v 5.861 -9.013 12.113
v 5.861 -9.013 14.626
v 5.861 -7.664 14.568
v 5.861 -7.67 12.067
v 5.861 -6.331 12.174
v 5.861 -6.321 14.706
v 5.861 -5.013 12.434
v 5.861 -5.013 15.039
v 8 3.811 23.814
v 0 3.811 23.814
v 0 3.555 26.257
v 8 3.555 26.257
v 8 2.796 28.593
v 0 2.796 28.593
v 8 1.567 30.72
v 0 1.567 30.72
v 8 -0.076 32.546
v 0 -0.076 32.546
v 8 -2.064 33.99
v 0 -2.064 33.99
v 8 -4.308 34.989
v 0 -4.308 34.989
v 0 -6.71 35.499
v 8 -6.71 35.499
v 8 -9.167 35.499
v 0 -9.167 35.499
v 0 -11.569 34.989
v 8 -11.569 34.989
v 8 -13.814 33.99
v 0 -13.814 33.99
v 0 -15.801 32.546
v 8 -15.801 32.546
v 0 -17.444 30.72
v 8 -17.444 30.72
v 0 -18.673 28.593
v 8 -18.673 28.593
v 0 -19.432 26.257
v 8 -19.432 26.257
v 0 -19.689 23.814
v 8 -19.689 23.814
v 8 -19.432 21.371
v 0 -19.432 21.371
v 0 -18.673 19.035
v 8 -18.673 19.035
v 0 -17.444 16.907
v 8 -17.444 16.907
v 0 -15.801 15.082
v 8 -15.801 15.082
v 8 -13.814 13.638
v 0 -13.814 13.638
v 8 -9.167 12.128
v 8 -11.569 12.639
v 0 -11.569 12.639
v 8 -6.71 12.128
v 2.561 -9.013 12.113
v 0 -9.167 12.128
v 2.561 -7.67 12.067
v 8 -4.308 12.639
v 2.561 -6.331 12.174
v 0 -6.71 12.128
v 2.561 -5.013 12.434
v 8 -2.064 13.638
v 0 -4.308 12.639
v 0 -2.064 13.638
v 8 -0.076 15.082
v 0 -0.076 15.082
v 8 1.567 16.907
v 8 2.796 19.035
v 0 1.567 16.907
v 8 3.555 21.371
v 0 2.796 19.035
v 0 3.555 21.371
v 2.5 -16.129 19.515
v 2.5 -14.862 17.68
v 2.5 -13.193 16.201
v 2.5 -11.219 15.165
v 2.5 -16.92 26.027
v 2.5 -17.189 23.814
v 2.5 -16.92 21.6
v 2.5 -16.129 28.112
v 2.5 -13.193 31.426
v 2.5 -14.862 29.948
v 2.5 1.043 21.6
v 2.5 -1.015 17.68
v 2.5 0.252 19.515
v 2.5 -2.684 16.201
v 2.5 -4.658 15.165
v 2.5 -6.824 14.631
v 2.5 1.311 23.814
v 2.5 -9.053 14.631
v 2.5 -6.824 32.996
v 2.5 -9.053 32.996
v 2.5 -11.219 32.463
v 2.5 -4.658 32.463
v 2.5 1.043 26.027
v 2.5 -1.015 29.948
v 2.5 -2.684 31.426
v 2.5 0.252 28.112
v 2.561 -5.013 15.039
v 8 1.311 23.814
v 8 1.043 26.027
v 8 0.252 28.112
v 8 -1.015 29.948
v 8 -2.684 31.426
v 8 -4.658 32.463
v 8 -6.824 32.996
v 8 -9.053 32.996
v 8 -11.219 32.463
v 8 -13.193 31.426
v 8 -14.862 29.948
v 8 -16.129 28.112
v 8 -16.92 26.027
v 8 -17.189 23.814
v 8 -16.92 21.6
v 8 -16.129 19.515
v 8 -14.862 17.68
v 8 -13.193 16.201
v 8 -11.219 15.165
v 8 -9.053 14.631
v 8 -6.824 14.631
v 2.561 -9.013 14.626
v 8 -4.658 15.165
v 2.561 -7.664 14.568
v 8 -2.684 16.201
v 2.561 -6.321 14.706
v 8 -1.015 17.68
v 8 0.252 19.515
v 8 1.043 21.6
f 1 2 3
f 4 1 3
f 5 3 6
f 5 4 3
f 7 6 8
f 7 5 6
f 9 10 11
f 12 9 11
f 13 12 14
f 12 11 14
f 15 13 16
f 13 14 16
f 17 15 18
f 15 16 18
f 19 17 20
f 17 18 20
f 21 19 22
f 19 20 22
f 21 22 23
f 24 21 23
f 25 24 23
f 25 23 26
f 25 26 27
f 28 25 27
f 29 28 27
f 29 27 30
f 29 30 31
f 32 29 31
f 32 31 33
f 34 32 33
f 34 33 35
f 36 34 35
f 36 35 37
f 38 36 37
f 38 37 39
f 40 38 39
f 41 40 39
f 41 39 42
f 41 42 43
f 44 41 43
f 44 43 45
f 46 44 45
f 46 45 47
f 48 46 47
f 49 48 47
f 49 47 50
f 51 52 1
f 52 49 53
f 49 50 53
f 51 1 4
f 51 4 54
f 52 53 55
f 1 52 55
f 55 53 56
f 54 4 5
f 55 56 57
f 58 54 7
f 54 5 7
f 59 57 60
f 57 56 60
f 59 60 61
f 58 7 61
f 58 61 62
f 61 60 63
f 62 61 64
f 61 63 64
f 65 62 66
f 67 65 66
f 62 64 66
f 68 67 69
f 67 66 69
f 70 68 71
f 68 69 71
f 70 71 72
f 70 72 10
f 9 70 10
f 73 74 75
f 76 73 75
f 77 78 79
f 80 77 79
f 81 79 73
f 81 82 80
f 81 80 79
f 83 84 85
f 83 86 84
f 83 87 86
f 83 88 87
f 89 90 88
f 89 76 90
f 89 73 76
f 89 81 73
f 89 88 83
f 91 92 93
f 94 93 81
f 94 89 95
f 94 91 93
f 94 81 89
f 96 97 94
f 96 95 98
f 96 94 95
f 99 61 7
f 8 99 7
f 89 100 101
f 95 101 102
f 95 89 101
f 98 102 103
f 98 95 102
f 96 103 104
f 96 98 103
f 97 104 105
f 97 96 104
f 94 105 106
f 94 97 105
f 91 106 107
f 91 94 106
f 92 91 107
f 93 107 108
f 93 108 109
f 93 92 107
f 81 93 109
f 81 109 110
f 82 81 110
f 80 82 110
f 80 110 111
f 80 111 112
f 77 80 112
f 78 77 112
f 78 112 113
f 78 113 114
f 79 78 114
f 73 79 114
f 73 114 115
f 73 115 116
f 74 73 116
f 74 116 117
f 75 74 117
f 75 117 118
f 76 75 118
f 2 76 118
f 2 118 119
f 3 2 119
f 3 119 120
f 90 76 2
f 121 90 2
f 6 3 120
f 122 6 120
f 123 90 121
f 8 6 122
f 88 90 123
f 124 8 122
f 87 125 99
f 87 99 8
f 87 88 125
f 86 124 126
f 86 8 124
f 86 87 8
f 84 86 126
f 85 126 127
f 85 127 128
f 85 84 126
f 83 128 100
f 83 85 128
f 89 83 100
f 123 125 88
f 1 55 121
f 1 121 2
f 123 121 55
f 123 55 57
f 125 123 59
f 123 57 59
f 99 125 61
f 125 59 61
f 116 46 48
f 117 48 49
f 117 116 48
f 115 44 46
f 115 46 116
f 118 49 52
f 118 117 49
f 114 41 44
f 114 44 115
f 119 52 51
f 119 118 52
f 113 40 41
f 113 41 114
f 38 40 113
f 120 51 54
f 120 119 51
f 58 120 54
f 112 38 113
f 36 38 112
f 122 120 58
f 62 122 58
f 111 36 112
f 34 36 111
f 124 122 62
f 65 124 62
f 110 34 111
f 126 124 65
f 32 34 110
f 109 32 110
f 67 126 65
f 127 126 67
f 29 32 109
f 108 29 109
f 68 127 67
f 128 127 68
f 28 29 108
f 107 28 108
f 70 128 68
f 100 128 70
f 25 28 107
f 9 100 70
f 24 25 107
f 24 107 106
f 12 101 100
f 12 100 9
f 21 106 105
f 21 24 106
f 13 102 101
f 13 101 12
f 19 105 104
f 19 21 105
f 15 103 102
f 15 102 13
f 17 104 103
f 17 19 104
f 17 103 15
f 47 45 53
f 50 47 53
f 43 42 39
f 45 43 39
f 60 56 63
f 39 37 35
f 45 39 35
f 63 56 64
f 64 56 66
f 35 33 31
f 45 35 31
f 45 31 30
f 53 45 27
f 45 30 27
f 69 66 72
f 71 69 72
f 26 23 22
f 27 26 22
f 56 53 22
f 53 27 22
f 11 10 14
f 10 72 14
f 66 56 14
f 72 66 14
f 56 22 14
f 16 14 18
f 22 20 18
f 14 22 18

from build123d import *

# Parameters (mm, degrees)
F0_R     = 11.75
F1_DEPTH = 8
F2_T     = -2.5
F3_W     = 3.3
F3_H     = 4
F4_DEPTH = 25


with BuildPart() as f1:
    # F0 (on Right) → F1 (new body)
    with BuildSketch(Plane.YZ):
        with Locations((-7.938508, 23.813721)):
            Circle(F0_R)
    extrude(amount=F1_DEPTH)

    # F2
    f2_openings = [f1.faces().sort_by_distance(p)[0] for p in [
        (8, -7.938508, 23.813721),
    ]]
    offset(amount=F2_T, openings=f2_openings)

    # F3 (on Top) → F4 (cut)
    with BuildSketch(Plane.XY):
        with Locations((4.21131, -7.012647)):
            Rectangle(F3_W, F3_H)
    extrude(amount=F4_DEPTH, mode=Mode.SUBTRACT)


solid = f1.part
